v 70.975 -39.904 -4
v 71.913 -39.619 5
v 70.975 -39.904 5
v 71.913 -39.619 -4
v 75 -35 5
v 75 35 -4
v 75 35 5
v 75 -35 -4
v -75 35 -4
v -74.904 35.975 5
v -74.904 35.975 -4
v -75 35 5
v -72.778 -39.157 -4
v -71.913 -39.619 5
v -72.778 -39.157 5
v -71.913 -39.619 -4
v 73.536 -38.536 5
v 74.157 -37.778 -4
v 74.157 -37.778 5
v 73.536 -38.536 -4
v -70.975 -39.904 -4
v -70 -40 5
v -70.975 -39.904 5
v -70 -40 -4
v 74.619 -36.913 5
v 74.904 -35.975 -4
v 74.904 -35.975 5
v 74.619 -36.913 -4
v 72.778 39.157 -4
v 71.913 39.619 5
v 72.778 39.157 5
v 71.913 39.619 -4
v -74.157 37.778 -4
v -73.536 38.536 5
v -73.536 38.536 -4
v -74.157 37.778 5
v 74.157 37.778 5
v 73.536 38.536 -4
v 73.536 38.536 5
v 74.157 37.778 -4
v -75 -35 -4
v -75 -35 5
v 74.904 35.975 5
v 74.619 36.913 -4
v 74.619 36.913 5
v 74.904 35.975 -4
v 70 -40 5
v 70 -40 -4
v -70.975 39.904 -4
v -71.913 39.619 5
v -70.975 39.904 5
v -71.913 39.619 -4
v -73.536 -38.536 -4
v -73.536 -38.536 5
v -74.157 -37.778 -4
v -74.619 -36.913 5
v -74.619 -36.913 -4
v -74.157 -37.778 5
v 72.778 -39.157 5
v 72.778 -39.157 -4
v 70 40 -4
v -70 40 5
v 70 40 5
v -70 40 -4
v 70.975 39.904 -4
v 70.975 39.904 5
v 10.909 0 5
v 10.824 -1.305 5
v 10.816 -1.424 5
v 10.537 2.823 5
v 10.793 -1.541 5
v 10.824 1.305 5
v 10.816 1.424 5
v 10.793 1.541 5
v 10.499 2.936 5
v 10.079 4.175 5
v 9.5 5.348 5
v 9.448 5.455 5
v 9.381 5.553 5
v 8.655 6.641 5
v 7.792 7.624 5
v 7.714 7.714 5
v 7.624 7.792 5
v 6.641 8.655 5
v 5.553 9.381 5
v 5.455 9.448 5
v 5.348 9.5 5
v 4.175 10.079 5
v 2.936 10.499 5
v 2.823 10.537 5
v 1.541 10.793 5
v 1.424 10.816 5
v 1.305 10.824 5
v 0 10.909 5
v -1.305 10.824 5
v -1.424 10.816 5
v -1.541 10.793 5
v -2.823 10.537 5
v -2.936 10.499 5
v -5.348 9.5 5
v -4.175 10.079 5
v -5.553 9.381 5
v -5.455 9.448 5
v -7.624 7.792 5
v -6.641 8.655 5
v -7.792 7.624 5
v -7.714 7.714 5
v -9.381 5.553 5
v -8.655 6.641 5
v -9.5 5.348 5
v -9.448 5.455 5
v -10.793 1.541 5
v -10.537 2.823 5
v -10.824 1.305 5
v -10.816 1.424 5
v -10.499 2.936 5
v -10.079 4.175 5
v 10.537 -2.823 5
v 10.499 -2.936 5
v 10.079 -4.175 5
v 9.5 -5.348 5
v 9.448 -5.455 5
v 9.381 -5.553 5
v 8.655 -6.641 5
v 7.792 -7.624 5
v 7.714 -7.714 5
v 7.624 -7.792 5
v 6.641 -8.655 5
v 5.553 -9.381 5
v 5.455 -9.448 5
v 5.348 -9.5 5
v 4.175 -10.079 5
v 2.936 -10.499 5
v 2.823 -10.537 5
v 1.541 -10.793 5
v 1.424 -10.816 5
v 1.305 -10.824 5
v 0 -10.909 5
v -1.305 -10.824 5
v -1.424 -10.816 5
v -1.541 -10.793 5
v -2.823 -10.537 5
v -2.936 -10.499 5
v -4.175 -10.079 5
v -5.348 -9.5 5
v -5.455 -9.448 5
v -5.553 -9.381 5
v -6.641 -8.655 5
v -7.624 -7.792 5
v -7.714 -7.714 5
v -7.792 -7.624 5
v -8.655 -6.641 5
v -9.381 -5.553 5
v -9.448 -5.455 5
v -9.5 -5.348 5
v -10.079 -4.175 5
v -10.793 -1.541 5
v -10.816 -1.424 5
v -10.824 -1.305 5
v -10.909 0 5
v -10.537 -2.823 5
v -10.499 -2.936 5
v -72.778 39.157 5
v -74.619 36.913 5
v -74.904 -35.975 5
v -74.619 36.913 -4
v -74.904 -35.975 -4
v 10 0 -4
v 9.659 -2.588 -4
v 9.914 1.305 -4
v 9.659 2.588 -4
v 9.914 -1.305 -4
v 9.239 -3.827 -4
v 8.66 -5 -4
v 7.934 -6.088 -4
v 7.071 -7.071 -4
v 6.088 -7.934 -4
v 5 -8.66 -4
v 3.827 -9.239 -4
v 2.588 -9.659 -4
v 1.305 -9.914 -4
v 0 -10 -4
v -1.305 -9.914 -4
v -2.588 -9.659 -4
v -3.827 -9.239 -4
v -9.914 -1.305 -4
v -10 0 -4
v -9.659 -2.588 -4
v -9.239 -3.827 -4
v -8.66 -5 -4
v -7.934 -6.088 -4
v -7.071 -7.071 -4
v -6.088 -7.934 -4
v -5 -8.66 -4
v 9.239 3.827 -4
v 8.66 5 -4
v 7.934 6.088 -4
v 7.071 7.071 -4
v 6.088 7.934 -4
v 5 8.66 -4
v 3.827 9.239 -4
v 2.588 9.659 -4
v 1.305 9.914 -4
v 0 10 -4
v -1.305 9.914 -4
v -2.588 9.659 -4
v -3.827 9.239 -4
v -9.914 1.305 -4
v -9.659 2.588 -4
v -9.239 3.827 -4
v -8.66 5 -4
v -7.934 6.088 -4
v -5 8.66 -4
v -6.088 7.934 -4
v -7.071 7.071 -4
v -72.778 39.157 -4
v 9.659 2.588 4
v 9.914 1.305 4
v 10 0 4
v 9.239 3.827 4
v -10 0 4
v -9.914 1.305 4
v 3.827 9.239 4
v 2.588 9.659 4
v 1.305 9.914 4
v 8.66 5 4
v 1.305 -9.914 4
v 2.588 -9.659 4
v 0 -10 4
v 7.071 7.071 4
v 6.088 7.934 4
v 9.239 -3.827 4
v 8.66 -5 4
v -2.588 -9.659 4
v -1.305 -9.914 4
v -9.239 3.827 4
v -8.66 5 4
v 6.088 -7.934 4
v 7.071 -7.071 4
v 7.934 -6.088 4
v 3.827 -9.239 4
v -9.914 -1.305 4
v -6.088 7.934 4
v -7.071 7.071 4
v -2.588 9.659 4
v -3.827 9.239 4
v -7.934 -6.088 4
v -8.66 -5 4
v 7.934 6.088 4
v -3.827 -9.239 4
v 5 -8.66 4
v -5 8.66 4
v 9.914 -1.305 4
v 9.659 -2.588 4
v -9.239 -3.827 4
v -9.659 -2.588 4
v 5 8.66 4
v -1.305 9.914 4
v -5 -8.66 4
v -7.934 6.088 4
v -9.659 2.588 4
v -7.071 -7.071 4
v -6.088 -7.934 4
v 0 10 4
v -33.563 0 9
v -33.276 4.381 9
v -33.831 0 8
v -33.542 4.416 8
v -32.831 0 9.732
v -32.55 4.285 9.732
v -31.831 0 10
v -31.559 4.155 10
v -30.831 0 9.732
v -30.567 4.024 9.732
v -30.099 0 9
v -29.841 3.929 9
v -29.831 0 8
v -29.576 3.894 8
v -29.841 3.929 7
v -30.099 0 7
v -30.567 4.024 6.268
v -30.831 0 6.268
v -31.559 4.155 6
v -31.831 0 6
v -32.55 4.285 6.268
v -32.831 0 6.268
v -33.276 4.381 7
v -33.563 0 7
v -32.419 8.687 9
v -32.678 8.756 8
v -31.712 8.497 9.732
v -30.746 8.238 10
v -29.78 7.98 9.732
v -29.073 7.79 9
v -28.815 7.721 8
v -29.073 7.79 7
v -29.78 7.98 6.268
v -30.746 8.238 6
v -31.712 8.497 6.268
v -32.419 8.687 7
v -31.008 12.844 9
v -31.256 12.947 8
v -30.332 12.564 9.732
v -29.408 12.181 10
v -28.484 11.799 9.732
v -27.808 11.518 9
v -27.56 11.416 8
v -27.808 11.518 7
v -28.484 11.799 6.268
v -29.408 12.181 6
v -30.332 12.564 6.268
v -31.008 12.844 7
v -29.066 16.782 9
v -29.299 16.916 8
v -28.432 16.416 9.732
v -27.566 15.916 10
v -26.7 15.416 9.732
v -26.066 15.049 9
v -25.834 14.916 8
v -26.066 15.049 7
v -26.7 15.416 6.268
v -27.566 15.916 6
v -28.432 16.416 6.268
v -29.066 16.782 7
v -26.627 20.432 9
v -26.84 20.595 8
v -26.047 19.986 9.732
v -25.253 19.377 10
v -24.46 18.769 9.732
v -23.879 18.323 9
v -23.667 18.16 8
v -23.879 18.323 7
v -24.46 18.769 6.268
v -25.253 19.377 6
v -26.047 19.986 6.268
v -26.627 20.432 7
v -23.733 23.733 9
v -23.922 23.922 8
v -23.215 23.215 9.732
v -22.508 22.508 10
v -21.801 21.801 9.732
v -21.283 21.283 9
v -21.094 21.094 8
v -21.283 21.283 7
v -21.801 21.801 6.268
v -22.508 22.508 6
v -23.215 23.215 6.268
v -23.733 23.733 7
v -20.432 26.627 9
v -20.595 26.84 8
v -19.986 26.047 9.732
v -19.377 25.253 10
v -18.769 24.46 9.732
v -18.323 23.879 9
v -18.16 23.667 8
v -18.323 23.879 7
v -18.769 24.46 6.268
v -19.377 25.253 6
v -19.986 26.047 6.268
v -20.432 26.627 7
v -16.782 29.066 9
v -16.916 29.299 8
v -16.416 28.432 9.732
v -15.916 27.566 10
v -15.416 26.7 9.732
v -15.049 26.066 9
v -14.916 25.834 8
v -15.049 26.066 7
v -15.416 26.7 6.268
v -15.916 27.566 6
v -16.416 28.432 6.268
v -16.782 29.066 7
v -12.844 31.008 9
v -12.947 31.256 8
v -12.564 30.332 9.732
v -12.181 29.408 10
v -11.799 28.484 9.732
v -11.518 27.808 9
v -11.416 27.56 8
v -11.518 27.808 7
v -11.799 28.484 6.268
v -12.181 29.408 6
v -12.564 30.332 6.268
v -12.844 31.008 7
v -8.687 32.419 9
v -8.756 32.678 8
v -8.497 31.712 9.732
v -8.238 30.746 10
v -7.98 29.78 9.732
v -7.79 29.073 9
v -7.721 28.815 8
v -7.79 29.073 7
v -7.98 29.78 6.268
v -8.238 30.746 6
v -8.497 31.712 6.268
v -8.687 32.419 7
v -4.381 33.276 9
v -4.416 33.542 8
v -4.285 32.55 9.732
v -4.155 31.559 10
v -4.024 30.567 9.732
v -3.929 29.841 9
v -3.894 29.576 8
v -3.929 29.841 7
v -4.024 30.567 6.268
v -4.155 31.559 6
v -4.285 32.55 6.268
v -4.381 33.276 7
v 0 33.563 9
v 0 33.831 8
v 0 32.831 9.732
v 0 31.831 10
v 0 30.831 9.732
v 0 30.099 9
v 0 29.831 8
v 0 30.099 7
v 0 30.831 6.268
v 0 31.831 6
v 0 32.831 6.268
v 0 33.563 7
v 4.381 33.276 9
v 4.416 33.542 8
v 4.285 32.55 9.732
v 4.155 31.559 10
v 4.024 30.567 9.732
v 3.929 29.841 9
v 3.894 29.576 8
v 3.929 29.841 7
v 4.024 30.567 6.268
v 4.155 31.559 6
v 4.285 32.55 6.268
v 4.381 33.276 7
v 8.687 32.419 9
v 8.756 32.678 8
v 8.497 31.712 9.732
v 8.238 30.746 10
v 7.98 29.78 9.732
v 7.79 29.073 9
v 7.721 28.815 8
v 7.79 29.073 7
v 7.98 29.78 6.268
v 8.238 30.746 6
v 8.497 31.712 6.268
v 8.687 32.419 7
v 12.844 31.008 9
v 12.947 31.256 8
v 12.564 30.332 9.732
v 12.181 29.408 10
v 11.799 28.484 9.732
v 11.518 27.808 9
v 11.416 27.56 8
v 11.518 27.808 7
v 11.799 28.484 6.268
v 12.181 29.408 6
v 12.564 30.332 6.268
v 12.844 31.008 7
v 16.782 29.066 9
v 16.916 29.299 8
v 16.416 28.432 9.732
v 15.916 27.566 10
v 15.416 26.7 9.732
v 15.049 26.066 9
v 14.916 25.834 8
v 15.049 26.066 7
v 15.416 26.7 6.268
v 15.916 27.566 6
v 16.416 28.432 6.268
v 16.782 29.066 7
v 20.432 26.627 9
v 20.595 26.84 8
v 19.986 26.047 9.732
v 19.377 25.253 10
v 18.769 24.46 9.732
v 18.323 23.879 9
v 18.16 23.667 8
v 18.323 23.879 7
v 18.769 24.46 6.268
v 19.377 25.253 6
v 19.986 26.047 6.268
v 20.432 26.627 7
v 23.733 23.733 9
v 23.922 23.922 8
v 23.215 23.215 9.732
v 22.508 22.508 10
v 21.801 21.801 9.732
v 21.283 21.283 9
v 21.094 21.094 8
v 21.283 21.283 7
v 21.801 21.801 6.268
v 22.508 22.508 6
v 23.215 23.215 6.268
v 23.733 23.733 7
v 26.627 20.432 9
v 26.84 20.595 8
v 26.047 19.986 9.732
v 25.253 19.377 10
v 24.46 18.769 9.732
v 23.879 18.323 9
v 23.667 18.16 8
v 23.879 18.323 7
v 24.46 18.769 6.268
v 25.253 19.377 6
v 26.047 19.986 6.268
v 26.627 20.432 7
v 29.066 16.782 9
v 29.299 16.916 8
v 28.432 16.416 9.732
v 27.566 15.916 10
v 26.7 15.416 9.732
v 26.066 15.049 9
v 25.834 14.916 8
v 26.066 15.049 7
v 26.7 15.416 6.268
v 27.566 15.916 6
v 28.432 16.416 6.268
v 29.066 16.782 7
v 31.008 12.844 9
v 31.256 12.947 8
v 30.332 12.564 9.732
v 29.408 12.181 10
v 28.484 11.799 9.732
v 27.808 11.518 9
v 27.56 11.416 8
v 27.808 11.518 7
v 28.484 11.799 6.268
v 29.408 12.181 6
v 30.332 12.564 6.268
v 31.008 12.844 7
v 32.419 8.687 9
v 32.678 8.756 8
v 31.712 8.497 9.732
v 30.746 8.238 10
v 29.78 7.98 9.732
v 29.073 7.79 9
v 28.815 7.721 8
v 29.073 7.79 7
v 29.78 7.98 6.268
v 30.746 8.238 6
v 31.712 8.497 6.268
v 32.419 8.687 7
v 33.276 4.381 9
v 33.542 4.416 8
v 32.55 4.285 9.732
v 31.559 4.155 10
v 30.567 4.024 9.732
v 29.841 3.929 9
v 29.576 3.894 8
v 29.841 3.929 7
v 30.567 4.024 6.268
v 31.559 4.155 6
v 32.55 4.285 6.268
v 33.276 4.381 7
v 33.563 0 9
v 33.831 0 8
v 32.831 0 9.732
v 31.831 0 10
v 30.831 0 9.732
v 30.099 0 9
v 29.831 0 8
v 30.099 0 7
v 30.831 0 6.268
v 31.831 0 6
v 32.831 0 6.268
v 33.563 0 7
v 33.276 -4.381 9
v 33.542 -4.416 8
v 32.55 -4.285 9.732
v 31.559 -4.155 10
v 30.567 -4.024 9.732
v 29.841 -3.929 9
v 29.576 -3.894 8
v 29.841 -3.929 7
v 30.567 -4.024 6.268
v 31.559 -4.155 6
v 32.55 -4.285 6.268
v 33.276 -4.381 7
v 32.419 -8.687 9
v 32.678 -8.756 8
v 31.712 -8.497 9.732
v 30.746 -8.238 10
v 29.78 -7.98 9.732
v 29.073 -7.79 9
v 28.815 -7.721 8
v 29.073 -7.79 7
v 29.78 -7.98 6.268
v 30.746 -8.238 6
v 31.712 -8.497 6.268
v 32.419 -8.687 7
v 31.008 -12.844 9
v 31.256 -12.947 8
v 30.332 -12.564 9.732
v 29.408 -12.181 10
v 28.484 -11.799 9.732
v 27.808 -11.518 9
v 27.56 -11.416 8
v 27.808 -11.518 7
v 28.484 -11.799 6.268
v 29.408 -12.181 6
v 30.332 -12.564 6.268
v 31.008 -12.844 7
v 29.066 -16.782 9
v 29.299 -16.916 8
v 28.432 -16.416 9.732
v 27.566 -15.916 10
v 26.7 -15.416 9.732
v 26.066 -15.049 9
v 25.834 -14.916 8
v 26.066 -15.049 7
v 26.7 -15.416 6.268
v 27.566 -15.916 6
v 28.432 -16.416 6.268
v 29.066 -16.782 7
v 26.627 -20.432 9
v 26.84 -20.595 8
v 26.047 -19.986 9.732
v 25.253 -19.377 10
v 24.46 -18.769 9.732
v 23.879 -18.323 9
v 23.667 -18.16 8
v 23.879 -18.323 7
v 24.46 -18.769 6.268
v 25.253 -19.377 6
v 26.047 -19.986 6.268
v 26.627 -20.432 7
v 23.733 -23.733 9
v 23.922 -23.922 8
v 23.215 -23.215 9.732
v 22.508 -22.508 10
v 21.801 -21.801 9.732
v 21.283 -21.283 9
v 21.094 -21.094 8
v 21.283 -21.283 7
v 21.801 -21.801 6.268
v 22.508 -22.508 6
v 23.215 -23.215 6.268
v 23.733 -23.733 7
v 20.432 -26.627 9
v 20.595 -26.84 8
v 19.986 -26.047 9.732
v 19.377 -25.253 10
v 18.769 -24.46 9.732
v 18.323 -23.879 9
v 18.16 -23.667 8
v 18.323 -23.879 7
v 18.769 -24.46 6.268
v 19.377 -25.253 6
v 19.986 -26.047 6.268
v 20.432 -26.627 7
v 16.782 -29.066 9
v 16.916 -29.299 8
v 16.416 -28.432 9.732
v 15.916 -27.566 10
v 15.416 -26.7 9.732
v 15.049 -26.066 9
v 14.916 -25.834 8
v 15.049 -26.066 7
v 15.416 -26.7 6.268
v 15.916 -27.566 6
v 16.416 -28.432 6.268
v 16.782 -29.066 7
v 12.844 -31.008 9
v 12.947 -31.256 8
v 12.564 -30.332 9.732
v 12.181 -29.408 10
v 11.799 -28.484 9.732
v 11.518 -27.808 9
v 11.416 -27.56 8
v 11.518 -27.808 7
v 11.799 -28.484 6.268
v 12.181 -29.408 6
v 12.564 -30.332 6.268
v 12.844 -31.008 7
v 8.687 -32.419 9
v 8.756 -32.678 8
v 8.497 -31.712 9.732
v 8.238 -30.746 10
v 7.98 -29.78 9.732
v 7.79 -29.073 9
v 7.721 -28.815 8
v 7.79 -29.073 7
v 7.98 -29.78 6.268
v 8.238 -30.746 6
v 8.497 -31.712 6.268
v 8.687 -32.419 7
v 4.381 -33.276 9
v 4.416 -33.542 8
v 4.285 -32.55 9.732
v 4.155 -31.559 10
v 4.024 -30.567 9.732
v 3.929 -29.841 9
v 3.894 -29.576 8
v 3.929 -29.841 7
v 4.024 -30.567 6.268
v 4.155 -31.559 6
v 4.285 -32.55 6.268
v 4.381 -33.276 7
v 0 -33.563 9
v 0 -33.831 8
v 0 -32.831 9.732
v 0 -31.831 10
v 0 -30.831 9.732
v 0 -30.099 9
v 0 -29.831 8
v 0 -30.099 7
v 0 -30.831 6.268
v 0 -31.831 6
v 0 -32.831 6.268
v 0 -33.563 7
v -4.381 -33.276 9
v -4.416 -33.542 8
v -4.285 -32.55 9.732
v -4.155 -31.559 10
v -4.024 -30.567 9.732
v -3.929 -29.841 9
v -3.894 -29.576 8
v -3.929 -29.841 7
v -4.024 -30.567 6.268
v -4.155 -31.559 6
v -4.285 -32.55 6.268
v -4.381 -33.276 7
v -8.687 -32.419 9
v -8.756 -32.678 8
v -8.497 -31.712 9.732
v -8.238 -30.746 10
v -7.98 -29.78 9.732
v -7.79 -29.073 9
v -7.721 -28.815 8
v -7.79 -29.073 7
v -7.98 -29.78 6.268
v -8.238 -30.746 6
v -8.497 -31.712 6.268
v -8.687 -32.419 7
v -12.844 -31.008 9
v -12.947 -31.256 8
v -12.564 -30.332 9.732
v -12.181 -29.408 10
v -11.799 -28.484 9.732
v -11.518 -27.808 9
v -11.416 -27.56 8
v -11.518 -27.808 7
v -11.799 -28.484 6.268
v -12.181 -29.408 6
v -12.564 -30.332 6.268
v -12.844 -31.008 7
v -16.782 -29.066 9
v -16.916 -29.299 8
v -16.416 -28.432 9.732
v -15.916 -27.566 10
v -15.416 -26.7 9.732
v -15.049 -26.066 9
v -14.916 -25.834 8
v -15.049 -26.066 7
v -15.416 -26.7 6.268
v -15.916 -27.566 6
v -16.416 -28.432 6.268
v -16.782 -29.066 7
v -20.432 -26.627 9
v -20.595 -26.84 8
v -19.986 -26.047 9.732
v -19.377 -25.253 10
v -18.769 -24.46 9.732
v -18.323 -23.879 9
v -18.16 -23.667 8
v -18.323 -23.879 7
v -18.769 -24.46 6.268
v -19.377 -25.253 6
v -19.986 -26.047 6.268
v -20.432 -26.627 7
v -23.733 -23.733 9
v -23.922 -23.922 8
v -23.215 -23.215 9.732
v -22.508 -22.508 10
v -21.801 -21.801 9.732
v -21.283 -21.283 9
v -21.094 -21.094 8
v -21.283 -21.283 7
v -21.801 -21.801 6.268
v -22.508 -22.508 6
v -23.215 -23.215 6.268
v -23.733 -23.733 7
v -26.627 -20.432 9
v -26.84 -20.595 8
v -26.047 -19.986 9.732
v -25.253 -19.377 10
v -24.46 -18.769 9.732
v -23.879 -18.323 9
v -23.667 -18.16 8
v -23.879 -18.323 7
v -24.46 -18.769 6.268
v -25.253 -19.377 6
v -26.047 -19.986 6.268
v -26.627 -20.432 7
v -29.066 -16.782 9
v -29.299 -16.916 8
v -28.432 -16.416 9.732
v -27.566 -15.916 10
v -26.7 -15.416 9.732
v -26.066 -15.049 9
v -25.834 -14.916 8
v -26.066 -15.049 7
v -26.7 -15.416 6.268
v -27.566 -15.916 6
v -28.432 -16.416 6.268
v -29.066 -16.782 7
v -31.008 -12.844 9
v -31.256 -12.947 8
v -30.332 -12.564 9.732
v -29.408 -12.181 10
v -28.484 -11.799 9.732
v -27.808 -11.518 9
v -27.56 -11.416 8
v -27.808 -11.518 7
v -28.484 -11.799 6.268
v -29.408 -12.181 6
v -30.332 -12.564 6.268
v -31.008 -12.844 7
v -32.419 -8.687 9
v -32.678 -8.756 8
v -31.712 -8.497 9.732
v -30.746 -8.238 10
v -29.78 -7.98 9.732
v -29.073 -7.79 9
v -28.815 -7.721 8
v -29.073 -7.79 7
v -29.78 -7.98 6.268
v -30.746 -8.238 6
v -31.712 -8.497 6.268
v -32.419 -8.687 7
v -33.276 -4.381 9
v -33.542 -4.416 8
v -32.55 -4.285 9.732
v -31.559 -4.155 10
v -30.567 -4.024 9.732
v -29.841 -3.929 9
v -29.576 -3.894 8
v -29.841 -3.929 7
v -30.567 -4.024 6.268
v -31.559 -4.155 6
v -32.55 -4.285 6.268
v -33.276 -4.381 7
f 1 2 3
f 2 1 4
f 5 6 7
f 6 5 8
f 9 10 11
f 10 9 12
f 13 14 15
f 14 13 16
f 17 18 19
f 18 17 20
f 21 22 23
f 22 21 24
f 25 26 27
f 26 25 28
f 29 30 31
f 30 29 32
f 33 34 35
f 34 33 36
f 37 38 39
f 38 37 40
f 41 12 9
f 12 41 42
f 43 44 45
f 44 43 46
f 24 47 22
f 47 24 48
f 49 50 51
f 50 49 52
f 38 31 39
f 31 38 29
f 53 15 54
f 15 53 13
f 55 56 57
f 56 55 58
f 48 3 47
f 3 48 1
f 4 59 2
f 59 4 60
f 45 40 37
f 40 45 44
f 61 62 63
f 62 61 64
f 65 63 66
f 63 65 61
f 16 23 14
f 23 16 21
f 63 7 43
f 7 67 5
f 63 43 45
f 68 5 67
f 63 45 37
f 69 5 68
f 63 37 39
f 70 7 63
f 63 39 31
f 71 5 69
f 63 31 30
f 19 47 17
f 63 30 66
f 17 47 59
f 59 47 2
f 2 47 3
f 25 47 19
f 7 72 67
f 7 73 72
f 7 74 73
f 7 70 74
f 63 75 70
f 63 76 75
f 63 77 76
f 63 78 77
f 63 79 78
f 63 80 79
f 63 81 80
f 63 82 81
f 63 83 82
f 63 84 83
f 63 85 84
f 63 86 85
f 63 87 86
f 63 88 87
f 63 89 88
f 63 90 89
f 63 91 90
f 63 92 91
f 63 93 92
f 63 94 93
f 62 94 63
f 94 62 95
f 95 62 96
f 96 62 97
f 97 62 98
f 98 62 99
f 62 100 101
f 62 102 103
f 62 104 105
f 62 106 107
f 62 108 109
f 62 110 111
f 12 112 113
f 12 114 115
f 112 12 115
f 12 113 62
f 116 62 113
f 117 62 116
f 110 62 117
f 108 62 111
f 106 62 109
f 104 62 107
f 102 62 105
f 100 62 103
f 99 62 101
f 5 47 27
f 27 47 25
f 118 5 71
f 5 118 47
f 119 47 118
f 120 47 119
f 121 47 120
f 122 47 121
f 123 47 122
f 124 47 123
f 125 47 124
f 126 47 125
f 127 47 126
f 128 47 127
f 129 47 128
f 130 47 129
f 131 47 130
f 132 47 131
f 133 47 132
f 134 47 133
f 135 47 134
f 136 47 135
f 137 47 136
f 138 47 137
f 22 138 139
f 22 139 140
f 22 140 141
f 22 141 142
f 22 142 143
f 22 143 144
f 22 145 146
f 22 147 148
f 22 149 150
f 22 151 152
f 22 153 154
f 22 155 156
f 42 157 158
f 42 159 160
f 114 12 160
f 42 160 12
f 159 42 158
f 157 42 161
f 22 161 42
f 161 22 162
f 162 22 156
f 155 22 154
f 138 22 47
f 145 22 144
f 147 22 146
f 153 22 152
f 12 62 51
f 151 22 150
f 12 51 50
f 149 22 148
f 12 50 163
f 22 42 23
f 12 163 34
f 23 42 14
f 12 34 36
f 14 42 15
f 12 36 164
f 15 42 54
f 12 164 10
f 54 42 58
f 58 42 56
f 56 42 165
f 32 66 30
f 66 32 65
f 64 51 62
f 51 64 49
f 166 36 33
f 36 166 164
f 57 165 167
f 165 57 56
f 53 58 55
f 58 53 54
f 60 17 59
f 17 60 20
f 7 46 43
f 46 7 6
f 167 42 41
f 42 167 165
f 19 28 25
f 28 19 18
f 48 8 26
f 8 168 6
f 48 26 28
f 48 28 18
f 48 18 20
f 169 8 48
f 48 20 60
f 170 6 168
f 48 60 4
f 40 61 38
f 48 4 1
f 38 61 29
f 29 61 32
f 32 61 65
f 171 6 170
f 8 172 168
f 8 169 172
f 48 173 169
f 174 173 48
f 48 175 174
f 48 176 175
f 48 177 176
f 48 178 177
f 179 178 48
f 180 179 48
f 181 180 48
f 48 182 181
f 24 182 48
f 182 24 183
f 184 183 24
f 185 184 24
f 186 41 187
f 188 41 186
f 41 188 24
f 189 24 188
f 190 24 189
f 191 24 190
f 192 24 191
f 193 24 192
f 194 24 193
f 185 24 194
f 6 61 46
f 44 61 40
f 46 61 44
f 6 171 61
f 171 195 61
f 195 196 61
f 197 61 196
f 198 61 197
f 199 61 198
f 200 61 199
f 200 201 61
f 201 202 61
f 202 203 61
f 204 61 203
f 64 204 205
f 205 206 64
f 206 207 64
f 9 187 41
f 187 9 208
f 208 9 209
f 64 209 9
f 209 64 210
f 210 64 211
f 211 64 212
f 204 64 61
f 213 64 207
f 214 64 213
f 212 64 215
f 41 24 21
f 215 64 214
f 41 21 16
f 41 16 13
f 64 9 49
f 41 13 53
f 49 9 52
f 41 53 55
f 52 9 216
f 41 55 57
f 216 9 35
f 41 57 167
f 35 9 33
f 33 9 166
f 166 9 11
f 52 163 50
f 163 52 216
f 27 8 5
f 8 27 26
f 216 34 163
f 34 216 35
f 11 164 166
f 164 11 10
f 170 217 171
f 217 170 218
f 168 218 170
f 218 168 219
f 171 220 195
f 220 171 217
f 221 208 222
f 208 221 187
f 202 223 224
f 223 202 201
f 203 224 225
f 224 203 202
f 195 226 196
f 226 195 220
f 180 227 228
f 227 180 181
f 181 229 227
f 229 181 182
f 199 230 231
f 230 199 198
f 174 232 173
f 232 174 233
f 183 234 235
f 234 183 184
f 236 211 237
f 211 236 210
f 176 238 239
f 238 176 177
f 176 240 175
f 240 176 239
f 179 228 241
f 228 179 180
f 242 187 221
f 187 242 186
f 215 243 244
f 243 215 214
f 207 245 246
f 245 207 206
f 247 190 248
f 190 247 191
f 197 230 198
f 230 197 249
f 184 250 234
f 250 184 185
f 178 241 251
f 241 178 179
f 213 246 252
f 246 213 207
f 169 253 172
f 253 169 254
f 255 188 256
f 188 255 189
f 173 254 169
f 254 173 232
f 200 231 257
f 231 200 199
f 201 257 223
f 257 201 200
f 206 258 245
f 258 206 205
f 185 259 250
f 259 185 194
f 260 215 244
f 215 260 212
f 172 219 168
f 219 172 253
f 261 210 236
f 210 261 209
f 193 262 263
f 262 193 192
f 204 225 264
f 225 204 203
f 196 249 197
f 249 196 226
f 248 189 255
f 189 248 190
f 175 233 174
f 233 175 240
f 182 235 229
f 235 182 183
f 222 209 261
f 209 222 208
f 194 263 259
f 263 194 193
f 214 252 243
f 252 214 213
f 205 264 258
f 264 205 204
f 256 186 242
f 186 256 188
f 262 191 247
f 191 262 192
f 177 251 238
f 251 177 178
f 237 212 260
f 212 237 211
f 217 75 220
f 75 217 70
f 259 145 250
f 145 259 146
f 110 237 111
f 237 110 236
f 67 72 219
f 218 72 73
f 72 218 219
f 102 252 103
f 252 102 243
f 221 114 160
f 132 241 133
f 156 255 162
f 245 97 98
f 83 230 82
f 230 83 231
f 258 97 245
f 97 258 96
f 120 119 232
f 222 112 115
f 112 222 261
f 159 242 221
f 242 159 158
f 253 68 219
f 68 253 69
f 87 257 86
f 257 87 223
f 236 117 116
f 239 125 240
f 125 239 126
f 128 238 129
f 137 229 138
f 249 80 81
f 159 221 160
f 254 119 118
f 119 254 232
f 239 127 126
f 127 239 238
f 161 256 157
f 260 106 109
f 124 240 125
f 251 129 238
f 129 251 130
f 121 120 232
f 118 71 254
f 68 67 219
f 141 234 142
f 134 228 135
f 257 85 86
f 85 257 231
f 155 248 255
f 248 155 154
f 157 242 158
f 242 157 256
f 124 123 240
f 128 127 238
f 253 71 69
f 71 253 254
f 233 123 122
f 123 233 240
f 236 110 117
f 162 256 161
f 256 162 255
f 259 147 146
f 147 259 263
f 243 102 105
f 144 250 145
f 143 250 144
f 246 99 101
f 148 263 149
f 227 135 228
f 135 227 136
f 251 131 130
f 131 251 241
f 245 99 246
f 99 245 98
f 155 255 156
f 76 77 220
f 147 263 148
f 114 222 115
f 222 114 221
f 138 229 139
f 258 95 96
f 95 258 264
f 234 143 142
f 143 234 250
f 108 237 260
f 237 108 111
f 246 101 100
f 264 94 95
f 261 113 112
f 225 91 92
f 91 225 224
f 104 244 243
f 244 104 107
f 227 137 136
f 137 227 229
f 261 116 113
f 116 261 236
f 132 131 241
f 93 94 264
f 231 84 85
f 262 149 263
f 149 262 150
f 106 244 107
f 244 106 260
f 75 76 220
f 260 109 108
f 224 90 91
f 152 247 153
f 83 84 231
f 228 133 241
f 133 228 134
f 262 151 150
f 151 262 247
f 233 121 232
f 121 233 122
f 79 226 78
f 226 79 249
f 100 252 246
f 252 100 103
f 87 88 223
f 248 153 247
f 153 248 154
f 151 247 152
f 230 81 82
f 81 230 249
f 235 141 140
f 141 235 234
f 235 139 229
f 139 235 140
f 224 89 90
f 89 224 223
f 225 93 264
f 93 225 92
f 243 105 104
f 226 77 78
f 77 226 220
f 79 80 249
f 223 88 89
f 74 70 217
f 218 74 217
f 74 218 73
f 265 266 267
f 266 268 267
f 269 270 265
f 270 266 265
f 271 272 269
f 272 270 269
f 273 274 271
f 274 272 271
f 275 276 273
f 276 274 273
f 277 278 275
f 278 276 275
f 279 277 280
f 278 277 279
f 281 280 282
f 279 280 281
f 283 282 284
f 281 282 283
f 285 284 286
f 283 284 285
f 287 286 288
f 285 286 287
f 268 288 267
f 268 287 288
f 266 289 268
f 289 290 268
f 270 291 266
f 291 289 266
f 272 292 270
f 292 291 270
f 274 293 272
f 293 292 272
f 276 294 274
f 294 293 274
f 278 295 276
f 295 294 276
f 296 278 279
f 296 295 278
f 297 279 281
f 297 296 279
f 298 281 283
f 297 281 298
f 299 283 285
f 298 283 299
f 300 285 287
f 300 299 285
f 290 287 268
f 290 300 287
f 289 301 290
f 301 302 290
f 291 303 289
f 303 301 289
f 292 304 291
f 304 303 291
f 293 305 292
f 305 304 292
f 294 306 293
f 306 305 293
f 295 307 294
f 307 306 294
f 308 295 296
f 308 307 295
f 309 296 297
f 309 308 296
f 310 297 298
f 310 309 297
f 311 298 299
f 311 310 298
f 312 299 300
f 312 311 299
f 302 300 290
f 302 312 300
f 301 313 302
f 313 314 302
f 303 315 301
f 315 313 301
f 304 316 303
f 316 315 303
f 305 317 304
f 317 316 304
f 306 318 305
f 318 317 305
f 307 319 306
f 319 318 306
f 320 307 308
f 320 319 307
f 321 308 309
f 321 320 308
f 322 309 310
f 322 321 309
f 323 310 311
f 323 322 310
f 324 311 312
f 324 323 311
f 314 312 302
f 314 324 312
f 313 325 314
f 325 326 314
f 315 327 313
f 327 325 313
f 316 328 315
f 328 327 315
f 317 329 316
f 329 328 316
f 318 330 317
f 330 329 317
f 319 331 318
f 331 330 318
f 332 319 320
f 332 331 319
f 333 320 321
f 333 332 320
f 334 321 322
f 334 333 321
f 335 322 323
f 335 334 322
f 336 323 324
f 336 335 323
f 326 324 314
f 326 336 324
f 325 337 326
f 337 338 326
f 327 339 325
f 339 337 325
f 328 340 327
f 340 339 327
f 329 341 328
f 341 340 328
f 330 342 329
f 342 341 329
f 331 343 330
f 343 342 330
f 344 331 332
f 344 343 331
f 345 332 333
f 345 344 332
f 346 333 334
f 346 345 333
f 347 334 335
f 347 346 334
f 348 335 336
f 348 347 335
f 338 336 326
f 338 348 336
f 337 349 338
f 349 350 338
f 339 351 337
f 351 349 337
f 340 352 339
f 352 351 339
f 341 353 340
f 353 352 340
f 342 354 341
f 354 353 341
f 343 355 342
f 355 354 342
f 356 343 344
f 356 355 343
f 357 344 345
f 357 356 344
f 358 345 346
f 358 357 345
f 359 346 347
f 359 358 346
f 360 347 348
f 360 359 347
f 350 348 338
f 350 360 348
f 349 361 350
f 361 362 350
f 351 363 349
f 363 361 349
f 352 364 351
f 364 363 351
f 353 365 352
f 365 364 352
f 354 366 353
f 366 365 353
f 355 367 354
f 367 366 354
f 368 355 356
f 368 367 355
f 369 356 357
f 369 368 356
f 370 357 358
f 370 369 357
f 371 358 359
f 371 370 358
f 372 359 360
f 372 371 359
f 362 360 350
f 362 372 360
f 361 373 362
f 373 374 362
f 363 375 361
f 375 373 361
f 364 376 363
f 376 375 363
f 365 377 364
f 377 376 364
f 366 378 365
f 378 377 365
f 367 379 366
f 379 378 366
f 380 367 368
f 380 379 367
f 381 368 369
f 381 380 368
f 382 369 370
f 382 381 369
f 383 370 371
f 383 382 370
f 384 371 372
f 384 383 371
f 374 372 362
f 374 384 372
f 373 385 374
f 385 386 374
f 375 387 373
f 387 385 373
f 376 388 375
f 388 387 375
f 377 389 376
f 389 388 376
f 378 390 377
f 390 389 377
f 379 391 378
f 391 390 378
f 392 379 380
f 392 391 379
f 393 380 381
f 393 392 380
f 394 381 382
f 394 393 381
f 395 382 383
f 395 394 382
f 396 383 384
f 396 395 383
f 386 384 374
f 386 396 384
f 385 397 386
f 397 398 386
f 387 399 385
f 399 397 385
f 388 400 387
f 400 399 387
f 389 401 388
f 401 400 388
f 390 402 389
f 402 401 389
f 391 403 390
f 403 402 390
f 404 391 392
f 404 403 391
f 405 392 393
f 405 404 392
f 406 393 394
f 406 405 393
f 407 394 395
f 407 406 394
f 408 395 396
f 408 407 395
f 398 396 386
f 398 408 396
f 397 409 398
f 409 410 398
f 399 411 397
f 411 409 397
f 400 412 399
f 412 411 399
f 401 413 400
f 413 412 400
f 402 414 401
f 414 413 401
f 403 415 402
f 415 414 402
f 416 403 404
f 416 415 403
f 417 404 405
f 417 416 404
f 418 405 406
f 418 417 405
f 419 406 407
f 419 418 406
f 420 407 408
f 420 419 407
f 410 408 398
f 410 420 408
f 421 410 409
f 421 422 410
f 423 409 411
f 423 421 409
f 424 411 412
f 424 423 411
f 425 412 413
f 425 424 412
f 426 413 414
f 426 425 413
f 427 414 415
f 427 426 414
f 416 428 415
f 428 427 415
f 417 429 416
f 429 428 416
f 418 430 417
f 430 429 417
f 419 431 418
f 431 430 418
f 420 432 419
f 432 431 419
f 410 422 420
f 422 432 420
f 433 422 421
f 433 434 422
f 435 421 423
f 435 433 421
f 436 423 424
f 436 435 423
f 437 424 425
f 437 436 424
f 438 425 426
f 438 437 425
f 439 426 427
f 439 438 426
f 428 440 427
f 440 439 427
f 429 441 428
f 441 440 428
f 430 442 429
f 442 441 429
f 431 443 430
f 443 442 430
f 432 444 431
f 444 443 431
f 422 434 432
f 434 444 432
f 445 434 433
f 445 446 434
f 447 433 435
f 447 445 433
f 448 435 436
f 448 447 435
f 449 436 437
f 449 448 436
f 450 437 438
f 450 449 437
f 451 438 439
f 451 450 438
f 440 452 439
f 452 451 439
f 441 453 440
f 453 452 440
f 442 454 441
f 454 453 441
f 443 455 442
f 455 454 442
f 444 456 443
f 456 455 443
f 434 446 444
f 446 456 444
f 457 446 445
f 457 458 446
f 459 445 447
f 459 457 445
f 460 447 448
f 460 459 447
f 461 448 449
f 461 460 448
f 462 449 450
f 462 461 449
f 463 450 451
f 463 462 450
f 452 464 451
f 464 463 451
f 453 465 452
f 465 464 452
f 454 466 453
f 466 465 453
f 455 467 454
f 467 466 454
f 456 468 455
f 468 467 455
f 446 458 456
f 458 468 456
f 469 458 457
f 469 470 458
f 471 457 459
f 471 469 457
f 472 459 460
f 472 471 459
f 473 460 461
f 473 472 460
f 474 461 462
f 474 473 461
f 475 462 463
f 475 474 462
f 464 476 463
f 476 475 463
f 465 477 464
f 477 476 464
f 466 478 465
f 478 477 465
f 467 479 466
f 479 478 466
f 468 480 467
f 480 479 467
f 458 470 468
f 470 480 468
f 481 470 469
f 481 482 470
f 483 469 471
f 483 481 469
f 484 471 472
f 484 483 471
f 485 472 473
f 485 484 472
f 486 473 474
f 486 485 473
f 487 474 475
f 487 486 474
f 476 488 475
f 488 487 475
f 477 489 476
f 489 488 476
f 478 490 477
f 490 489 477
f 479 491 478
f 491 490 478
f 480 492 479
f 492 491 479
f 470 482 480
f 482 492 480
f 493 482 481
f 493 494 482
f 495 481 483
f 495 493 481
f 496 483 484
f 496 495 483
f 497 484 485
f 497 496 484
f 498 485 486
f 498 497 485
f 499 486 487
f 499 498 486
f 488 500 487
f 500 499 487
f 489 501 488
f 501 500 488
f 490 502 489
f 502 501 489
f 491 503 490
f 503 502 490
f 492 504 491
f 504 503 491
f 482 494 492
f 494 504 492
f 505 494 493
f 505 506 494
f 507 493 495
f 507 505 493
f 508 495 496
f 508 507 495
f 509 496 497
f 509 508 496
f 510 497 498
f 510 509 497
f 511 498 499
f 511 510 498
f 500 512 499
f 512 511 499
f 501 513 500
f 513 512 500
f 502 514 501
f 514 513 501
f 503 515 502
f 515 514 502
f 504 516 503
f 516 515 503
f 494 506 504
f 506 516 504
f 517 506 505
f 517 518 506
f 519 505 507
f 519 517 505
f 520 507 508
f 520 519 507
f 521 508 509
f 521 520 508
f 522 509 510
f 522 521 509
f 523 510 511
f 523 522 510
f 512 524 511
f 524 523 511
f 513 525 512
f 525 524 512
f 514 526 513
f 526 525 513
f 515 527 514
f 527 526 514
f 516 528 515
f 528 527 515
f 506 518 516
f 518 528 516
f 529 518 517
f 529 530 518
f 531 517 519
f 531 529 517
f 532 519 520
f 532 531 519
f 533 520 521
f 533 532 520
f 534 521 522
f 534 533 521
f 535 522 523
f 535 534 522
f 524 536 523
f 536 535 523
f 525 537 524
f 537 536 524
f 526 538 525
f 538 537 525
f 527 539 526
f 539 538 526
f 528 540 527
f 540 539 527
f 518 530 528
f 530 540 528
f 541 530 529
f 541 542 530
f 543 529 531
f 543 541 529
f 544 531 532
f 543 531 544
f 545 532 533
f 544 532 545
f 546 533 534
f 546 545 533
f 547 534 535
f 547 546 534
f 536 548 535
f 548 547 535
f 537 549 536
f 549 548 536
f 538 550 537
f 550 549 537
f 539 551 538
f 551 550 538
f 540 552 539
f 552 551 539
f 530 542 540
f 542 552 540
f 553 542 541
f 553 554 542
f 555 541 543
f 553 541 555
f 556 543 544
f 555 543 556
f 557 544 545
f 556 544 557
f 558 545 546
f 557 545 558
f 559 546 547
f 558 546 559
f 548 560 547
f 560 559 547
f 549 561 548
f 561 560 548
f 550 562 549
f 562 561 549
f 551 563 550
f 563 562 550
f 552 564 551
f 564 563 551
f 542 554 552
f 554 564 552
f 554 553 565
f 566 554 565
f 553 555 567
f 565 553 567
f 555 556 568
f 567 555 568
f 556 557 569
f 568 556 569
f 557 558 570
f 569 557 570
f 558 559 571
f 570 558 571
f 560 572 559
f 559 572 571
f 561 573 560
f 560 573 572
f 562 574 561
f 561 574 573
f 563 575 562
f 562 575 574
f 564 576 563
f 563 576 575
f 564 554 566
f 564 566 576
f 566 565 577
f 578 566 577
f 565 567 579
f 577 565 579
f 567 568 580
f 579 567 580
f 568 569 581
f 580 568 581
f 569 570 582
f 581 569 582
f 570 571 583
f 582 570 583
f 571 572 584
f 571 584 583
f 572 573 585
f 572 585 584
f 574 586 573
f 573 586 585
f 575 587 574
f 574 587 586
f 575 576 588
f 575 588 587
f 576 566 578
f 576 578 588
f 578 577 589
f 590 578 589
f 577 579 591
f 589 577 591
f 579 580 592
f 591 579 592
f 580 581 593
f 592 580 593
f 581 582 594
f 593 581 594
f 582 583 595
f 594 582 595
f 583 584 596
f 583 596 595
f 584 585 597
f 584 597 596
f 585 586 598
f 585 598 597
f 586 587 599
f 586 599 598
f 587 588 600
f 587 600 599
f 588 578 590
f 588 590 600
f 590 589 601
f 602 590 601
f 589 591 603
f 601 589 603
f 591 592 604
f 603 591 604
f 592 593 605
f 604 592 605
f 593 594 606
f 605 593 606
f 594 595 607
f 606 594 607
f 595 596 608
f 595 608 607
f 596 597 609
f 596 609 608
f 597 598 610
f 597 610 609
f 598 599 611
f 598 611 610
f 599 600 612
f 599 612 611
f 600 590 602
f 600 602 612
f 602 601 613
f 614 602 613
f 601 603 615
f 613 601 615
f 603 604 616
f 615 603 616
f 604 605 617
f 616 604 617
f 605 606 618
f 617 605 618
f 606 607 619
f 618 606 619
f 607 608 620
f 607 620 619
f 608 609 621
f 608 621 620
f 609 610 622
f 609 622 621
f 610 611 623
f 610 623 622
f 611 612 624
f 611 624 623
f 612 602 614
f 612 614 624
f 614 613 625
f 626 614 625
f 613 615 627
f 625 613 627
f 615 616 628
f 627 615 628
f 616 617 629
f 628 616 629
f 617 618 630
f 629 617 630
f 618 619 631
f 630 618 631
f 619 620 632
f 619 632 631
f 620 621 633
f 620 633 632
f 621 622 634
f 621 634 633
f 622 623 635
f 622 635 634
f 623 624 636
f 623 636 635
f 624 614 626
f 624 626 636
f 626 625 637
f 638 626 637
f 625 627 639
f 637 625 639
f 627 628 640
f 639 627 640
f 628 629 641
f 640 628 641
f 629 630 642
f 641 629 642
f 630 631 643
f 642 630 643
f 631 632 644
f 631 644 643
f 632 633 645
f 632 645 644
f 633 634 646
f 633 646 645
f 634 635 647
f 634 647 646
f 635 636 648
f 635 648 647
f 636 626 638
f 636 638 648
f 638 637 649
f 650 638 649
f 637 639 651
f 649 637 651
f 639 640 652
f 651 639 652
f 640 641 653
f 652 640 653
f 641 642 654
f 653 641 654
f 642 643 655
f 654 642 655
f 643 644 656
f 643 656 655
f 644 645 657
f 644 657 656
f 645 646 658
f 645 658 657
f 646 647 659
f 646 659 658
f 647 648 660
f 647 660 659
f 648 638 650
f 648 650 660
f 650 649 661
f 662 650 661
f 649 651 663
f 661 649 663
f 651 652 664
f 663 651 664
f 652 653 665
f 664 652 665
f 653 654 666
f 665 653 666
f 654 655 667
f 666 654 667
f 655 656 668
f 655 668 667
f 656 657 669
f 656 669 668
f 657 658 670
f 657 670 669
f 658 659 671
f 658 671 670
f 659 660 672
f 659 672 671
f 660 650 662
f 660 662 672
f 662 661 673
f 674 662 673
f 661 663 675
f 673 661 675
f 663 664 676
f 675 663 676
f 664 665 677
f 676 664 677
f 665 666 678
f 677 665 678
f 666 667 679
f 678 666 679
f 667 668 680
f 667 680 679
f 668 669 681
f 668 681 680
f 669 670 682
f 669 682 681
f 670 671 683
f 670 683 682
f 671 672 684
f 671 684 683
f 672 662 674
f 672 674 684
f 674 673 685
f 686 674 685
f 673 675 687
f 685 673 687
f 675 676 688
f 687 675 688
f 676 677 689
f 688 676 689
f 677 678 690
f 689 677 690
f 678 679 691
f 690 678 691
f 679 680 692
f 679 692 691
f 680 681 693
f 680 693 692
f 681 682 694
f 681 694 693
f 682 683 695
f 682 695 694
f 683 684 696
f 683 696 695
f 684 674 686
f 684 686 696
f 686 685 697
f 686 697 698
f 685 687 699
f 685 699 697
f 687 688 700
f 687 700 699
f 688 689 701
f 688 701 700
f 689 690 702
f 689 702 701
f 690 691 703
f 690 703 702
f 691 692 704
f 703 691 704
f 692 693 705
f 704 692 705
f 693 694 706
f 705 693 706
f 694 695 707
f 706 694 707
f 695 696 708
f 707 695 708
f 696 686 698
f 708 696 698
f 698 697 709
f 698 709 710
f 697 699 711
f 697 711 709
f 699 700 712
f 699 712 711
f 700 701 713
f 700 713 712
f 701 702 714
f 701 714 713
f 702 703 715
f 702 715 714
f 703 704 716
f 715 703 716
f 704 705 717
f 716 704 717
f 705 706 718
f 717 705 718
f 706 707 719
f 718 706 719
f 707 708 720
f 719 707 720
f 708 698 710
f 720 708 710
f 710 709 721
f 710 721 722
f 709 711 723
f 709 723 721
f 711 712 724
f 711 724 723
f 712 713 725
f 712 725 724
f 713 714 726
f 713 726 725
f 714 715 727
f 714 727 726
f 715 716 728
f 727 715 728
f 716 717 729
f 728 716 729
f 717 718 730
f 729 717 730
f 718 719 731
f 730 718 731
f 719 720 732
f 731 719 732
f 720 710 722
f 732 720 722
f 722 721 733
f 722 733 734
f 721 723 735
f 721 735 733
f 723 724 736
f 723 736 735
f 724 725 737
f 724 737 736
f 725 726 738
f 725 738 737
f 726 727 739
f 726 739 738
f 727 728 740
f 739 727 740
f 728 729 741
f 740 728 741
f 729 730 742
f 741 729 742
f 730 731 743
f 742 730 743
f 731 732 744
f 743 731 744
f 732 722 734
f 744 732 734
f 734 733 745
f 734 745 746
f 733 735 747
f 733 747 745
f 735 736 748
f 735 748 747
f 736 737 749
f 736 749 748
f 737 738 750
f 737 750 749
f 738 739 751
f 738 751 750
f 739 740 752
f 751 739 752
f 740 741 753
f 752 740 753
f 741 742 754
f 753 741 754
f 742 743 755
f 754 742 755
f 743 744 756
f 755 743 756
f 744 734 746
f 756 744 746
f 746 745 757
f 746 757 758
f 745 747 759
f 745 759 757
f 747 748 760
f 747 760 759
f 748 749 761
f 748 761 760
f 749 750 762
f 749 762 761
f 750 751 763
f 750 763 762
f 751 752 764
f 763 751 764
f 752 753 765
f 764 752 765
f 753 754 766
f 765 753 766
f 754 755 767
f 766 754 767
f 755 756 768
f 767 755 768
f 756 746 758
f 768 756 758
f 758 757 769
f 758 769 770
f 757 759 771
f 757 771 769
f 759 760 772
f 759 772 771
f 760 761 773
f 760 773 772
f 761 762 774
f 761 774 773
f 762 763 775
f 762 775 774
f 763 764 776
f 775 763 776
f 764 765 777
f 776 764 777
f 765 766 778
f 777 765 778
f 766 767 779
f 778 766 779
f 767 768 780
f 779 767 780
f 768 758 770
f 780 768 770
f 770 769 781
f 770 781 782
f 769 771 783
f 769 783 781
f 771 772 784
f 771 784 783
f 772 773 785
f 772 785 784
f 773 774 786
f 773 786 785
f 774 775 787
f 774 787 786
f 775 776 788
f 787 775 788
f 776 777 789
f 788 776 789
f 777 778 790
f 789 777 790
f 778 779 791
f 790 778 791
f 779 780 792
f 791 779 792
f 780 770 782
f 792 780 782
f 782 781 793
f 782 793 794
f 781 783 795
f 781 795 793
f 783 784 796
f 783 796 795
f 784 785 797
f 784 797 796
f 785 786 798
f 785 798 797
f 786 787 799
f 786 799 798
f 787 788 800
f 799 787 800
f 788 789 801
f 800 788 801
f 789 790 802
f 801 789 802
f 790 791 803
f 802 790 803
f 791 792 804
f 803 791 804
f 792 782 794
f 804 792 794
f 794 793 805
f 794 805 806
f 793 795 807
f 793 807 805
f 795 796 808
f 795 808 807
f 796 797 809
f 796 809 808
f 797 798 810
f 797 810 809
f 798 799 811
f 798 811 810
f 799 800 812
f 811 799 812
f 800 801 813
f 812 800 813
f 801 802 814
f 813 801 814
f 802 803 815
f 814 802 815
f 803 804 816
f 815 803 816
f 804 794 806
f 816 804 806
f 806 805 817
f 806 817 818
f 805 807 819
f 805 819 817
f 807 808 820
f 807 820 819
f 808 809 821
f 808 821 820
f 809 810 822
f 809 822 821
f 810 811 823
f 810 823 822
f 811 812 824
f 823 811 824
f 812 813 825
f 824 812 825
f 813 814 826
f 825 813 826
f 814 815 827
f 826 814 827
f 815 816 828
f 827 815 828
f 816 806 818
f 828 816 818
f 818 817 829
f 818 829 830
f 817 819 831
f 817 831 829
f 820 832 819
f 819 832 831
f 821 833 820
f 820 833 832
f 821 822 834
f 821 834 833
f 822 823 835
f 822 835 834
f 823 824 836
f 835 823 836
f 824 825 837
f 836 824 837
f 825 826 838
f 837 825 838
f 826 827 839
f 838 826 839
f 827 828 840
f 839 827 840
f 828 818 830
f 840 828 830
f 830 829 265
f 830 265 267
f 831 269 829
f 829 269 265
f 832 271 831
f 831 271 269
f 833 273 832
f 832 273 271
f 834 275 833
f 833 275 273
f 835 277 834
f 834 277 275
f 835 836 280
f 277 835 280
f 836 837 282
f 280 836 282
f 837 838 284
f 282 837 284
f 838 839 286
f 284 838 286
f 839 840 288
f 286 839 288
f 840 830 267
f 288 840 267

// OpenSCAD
// file: ../common/parameters.scad
// EXKNOTS - Global FDM Printing Parameters
// All dimensions in mm

// Rod dimensions (thickened from original 4mm steel for FDM)
rod_d = 6;
rod_r = rod_d / 2;

// Cord (real paracord 550 Type III)
cord_d = 4;
cord_hole_d = 6;       // Through-hole for cord (cord_d + 2mm clearance)
cord_slot_d = 7;       // Sliding channel (looser fit)
cord_countersink_d = 8; // Countersink for stopper knots
cord_countersink_depth = 3;

// Ring wire (thickened from original 4mm)
ring_wire_d = 6;

// Ball stops (thickened from original 8mm)
ball_stop_d = 12;

// Printer parameters
nozzle_d = 0.4;
layer_h = 0.2;
layer_h_fine = 0.12;

// Tolerances
clearance = 0.3;               // General moving-part clearance
press_fit_clearance = 0.15;    // Tight press-fit
snap_clearance = 0.4;          // Snap-fit (looser)

// Wall thicknesses
wall_min = 1.2;        // 3 perimeters @ 0.4mm nozzle
wall_structural = 2.0; // 5 perimeters

// Default facet count
$fn = 60;

// Detail facet count (for rings, ovals)
fn_detail = 120;
// main file
// EXKNOTS - Puzzle 2: Shepherd's Yoke
// FDM 3D Printable Version
//
// Parts: Paddle (1 piece) + 200mm paracord loop
// Print paddle flat on bed
//
// Print settings:
//   Paddle: PLA wood-tone, 0.20mm layers, 40% infill, no supports
//           Enable ironing on top surface for smooth cord sliding

include <../common/parameters.scad>

// Puzzle-specific parameters
p2_paddle_w = 150;
p2_paddle_h = 80;
p2_paddle_d = 10;
p2_hole_d = 20;
p2_chamfer = 1;          // Edge chamfer for smooth cord sliding
p2_corner_r = 5;         // Corner radius

// Cord loop check: paddle short edge must fit through loop
p2_loop_circ = 200;      // Paracord loop circumference
assert(p2_paddle_h < p2_loop_circ / 2,
       "Paddle short edge must be less than half loop circumference");

// Part selector
part = "assembly";

if (part == "paddle") {
    p2_paddle();
} else {
    p2_assembly();
}

module p2_paddle() {
    difference() {
        // Paddle body with rounded corners
        minkowski() {
            cube([p2_paddle_w - p2_corner_r*2,
                  p2_paddle_h - p2_corner_r*2,
                  p2_paddle_d - p2_chamfer*2], center=true);
            // Rounded edges (chamfer + corner radius combined)
            cylinder(r=p2_corner_r, h=p2_chamfer, $fn=32);
        }

        // Center hole with chamfered edges
        cylinder(d=p2_hole_d, h=p2_paddle_d + 2, center=true, $fn=48);

        // Chamfer on hole top edge
        translate([0, 0, p2_paddle_d/2 - p2_chamfer])
            cylinder(d1=p2_hole_d, d2=p2_hole_d + p2_chamfer*2,
                     h=p2_chamfer + 0.1, $fn=48);

        // Chamfer on hole bottom edge
        translate([0, 0, -p2_paddle_d/2 - 0.1])
            cylinder(d1=p2_hole_d + p2_chamfer*2, d2=p2_hole_d,
                     h=p2_chamfer + 0.1, $fn=48);
    }
}

module p2_assembly() {
    color("burlywood") p2_paddle();

    // Cord loop indicator (not printable)
    color("blue", 0.4)
    translate([0, 0, p2_paddle_d/2 + 3])
        torus_indicator(p2_loop_circ / 3.14159 / 2, 2);
}

module torus_indicator(r, tube_r) {
    rotate_extrude($fn=48)
    translate([r, 0, 0])
    circle(r=tube_r, $fn=12);
}
